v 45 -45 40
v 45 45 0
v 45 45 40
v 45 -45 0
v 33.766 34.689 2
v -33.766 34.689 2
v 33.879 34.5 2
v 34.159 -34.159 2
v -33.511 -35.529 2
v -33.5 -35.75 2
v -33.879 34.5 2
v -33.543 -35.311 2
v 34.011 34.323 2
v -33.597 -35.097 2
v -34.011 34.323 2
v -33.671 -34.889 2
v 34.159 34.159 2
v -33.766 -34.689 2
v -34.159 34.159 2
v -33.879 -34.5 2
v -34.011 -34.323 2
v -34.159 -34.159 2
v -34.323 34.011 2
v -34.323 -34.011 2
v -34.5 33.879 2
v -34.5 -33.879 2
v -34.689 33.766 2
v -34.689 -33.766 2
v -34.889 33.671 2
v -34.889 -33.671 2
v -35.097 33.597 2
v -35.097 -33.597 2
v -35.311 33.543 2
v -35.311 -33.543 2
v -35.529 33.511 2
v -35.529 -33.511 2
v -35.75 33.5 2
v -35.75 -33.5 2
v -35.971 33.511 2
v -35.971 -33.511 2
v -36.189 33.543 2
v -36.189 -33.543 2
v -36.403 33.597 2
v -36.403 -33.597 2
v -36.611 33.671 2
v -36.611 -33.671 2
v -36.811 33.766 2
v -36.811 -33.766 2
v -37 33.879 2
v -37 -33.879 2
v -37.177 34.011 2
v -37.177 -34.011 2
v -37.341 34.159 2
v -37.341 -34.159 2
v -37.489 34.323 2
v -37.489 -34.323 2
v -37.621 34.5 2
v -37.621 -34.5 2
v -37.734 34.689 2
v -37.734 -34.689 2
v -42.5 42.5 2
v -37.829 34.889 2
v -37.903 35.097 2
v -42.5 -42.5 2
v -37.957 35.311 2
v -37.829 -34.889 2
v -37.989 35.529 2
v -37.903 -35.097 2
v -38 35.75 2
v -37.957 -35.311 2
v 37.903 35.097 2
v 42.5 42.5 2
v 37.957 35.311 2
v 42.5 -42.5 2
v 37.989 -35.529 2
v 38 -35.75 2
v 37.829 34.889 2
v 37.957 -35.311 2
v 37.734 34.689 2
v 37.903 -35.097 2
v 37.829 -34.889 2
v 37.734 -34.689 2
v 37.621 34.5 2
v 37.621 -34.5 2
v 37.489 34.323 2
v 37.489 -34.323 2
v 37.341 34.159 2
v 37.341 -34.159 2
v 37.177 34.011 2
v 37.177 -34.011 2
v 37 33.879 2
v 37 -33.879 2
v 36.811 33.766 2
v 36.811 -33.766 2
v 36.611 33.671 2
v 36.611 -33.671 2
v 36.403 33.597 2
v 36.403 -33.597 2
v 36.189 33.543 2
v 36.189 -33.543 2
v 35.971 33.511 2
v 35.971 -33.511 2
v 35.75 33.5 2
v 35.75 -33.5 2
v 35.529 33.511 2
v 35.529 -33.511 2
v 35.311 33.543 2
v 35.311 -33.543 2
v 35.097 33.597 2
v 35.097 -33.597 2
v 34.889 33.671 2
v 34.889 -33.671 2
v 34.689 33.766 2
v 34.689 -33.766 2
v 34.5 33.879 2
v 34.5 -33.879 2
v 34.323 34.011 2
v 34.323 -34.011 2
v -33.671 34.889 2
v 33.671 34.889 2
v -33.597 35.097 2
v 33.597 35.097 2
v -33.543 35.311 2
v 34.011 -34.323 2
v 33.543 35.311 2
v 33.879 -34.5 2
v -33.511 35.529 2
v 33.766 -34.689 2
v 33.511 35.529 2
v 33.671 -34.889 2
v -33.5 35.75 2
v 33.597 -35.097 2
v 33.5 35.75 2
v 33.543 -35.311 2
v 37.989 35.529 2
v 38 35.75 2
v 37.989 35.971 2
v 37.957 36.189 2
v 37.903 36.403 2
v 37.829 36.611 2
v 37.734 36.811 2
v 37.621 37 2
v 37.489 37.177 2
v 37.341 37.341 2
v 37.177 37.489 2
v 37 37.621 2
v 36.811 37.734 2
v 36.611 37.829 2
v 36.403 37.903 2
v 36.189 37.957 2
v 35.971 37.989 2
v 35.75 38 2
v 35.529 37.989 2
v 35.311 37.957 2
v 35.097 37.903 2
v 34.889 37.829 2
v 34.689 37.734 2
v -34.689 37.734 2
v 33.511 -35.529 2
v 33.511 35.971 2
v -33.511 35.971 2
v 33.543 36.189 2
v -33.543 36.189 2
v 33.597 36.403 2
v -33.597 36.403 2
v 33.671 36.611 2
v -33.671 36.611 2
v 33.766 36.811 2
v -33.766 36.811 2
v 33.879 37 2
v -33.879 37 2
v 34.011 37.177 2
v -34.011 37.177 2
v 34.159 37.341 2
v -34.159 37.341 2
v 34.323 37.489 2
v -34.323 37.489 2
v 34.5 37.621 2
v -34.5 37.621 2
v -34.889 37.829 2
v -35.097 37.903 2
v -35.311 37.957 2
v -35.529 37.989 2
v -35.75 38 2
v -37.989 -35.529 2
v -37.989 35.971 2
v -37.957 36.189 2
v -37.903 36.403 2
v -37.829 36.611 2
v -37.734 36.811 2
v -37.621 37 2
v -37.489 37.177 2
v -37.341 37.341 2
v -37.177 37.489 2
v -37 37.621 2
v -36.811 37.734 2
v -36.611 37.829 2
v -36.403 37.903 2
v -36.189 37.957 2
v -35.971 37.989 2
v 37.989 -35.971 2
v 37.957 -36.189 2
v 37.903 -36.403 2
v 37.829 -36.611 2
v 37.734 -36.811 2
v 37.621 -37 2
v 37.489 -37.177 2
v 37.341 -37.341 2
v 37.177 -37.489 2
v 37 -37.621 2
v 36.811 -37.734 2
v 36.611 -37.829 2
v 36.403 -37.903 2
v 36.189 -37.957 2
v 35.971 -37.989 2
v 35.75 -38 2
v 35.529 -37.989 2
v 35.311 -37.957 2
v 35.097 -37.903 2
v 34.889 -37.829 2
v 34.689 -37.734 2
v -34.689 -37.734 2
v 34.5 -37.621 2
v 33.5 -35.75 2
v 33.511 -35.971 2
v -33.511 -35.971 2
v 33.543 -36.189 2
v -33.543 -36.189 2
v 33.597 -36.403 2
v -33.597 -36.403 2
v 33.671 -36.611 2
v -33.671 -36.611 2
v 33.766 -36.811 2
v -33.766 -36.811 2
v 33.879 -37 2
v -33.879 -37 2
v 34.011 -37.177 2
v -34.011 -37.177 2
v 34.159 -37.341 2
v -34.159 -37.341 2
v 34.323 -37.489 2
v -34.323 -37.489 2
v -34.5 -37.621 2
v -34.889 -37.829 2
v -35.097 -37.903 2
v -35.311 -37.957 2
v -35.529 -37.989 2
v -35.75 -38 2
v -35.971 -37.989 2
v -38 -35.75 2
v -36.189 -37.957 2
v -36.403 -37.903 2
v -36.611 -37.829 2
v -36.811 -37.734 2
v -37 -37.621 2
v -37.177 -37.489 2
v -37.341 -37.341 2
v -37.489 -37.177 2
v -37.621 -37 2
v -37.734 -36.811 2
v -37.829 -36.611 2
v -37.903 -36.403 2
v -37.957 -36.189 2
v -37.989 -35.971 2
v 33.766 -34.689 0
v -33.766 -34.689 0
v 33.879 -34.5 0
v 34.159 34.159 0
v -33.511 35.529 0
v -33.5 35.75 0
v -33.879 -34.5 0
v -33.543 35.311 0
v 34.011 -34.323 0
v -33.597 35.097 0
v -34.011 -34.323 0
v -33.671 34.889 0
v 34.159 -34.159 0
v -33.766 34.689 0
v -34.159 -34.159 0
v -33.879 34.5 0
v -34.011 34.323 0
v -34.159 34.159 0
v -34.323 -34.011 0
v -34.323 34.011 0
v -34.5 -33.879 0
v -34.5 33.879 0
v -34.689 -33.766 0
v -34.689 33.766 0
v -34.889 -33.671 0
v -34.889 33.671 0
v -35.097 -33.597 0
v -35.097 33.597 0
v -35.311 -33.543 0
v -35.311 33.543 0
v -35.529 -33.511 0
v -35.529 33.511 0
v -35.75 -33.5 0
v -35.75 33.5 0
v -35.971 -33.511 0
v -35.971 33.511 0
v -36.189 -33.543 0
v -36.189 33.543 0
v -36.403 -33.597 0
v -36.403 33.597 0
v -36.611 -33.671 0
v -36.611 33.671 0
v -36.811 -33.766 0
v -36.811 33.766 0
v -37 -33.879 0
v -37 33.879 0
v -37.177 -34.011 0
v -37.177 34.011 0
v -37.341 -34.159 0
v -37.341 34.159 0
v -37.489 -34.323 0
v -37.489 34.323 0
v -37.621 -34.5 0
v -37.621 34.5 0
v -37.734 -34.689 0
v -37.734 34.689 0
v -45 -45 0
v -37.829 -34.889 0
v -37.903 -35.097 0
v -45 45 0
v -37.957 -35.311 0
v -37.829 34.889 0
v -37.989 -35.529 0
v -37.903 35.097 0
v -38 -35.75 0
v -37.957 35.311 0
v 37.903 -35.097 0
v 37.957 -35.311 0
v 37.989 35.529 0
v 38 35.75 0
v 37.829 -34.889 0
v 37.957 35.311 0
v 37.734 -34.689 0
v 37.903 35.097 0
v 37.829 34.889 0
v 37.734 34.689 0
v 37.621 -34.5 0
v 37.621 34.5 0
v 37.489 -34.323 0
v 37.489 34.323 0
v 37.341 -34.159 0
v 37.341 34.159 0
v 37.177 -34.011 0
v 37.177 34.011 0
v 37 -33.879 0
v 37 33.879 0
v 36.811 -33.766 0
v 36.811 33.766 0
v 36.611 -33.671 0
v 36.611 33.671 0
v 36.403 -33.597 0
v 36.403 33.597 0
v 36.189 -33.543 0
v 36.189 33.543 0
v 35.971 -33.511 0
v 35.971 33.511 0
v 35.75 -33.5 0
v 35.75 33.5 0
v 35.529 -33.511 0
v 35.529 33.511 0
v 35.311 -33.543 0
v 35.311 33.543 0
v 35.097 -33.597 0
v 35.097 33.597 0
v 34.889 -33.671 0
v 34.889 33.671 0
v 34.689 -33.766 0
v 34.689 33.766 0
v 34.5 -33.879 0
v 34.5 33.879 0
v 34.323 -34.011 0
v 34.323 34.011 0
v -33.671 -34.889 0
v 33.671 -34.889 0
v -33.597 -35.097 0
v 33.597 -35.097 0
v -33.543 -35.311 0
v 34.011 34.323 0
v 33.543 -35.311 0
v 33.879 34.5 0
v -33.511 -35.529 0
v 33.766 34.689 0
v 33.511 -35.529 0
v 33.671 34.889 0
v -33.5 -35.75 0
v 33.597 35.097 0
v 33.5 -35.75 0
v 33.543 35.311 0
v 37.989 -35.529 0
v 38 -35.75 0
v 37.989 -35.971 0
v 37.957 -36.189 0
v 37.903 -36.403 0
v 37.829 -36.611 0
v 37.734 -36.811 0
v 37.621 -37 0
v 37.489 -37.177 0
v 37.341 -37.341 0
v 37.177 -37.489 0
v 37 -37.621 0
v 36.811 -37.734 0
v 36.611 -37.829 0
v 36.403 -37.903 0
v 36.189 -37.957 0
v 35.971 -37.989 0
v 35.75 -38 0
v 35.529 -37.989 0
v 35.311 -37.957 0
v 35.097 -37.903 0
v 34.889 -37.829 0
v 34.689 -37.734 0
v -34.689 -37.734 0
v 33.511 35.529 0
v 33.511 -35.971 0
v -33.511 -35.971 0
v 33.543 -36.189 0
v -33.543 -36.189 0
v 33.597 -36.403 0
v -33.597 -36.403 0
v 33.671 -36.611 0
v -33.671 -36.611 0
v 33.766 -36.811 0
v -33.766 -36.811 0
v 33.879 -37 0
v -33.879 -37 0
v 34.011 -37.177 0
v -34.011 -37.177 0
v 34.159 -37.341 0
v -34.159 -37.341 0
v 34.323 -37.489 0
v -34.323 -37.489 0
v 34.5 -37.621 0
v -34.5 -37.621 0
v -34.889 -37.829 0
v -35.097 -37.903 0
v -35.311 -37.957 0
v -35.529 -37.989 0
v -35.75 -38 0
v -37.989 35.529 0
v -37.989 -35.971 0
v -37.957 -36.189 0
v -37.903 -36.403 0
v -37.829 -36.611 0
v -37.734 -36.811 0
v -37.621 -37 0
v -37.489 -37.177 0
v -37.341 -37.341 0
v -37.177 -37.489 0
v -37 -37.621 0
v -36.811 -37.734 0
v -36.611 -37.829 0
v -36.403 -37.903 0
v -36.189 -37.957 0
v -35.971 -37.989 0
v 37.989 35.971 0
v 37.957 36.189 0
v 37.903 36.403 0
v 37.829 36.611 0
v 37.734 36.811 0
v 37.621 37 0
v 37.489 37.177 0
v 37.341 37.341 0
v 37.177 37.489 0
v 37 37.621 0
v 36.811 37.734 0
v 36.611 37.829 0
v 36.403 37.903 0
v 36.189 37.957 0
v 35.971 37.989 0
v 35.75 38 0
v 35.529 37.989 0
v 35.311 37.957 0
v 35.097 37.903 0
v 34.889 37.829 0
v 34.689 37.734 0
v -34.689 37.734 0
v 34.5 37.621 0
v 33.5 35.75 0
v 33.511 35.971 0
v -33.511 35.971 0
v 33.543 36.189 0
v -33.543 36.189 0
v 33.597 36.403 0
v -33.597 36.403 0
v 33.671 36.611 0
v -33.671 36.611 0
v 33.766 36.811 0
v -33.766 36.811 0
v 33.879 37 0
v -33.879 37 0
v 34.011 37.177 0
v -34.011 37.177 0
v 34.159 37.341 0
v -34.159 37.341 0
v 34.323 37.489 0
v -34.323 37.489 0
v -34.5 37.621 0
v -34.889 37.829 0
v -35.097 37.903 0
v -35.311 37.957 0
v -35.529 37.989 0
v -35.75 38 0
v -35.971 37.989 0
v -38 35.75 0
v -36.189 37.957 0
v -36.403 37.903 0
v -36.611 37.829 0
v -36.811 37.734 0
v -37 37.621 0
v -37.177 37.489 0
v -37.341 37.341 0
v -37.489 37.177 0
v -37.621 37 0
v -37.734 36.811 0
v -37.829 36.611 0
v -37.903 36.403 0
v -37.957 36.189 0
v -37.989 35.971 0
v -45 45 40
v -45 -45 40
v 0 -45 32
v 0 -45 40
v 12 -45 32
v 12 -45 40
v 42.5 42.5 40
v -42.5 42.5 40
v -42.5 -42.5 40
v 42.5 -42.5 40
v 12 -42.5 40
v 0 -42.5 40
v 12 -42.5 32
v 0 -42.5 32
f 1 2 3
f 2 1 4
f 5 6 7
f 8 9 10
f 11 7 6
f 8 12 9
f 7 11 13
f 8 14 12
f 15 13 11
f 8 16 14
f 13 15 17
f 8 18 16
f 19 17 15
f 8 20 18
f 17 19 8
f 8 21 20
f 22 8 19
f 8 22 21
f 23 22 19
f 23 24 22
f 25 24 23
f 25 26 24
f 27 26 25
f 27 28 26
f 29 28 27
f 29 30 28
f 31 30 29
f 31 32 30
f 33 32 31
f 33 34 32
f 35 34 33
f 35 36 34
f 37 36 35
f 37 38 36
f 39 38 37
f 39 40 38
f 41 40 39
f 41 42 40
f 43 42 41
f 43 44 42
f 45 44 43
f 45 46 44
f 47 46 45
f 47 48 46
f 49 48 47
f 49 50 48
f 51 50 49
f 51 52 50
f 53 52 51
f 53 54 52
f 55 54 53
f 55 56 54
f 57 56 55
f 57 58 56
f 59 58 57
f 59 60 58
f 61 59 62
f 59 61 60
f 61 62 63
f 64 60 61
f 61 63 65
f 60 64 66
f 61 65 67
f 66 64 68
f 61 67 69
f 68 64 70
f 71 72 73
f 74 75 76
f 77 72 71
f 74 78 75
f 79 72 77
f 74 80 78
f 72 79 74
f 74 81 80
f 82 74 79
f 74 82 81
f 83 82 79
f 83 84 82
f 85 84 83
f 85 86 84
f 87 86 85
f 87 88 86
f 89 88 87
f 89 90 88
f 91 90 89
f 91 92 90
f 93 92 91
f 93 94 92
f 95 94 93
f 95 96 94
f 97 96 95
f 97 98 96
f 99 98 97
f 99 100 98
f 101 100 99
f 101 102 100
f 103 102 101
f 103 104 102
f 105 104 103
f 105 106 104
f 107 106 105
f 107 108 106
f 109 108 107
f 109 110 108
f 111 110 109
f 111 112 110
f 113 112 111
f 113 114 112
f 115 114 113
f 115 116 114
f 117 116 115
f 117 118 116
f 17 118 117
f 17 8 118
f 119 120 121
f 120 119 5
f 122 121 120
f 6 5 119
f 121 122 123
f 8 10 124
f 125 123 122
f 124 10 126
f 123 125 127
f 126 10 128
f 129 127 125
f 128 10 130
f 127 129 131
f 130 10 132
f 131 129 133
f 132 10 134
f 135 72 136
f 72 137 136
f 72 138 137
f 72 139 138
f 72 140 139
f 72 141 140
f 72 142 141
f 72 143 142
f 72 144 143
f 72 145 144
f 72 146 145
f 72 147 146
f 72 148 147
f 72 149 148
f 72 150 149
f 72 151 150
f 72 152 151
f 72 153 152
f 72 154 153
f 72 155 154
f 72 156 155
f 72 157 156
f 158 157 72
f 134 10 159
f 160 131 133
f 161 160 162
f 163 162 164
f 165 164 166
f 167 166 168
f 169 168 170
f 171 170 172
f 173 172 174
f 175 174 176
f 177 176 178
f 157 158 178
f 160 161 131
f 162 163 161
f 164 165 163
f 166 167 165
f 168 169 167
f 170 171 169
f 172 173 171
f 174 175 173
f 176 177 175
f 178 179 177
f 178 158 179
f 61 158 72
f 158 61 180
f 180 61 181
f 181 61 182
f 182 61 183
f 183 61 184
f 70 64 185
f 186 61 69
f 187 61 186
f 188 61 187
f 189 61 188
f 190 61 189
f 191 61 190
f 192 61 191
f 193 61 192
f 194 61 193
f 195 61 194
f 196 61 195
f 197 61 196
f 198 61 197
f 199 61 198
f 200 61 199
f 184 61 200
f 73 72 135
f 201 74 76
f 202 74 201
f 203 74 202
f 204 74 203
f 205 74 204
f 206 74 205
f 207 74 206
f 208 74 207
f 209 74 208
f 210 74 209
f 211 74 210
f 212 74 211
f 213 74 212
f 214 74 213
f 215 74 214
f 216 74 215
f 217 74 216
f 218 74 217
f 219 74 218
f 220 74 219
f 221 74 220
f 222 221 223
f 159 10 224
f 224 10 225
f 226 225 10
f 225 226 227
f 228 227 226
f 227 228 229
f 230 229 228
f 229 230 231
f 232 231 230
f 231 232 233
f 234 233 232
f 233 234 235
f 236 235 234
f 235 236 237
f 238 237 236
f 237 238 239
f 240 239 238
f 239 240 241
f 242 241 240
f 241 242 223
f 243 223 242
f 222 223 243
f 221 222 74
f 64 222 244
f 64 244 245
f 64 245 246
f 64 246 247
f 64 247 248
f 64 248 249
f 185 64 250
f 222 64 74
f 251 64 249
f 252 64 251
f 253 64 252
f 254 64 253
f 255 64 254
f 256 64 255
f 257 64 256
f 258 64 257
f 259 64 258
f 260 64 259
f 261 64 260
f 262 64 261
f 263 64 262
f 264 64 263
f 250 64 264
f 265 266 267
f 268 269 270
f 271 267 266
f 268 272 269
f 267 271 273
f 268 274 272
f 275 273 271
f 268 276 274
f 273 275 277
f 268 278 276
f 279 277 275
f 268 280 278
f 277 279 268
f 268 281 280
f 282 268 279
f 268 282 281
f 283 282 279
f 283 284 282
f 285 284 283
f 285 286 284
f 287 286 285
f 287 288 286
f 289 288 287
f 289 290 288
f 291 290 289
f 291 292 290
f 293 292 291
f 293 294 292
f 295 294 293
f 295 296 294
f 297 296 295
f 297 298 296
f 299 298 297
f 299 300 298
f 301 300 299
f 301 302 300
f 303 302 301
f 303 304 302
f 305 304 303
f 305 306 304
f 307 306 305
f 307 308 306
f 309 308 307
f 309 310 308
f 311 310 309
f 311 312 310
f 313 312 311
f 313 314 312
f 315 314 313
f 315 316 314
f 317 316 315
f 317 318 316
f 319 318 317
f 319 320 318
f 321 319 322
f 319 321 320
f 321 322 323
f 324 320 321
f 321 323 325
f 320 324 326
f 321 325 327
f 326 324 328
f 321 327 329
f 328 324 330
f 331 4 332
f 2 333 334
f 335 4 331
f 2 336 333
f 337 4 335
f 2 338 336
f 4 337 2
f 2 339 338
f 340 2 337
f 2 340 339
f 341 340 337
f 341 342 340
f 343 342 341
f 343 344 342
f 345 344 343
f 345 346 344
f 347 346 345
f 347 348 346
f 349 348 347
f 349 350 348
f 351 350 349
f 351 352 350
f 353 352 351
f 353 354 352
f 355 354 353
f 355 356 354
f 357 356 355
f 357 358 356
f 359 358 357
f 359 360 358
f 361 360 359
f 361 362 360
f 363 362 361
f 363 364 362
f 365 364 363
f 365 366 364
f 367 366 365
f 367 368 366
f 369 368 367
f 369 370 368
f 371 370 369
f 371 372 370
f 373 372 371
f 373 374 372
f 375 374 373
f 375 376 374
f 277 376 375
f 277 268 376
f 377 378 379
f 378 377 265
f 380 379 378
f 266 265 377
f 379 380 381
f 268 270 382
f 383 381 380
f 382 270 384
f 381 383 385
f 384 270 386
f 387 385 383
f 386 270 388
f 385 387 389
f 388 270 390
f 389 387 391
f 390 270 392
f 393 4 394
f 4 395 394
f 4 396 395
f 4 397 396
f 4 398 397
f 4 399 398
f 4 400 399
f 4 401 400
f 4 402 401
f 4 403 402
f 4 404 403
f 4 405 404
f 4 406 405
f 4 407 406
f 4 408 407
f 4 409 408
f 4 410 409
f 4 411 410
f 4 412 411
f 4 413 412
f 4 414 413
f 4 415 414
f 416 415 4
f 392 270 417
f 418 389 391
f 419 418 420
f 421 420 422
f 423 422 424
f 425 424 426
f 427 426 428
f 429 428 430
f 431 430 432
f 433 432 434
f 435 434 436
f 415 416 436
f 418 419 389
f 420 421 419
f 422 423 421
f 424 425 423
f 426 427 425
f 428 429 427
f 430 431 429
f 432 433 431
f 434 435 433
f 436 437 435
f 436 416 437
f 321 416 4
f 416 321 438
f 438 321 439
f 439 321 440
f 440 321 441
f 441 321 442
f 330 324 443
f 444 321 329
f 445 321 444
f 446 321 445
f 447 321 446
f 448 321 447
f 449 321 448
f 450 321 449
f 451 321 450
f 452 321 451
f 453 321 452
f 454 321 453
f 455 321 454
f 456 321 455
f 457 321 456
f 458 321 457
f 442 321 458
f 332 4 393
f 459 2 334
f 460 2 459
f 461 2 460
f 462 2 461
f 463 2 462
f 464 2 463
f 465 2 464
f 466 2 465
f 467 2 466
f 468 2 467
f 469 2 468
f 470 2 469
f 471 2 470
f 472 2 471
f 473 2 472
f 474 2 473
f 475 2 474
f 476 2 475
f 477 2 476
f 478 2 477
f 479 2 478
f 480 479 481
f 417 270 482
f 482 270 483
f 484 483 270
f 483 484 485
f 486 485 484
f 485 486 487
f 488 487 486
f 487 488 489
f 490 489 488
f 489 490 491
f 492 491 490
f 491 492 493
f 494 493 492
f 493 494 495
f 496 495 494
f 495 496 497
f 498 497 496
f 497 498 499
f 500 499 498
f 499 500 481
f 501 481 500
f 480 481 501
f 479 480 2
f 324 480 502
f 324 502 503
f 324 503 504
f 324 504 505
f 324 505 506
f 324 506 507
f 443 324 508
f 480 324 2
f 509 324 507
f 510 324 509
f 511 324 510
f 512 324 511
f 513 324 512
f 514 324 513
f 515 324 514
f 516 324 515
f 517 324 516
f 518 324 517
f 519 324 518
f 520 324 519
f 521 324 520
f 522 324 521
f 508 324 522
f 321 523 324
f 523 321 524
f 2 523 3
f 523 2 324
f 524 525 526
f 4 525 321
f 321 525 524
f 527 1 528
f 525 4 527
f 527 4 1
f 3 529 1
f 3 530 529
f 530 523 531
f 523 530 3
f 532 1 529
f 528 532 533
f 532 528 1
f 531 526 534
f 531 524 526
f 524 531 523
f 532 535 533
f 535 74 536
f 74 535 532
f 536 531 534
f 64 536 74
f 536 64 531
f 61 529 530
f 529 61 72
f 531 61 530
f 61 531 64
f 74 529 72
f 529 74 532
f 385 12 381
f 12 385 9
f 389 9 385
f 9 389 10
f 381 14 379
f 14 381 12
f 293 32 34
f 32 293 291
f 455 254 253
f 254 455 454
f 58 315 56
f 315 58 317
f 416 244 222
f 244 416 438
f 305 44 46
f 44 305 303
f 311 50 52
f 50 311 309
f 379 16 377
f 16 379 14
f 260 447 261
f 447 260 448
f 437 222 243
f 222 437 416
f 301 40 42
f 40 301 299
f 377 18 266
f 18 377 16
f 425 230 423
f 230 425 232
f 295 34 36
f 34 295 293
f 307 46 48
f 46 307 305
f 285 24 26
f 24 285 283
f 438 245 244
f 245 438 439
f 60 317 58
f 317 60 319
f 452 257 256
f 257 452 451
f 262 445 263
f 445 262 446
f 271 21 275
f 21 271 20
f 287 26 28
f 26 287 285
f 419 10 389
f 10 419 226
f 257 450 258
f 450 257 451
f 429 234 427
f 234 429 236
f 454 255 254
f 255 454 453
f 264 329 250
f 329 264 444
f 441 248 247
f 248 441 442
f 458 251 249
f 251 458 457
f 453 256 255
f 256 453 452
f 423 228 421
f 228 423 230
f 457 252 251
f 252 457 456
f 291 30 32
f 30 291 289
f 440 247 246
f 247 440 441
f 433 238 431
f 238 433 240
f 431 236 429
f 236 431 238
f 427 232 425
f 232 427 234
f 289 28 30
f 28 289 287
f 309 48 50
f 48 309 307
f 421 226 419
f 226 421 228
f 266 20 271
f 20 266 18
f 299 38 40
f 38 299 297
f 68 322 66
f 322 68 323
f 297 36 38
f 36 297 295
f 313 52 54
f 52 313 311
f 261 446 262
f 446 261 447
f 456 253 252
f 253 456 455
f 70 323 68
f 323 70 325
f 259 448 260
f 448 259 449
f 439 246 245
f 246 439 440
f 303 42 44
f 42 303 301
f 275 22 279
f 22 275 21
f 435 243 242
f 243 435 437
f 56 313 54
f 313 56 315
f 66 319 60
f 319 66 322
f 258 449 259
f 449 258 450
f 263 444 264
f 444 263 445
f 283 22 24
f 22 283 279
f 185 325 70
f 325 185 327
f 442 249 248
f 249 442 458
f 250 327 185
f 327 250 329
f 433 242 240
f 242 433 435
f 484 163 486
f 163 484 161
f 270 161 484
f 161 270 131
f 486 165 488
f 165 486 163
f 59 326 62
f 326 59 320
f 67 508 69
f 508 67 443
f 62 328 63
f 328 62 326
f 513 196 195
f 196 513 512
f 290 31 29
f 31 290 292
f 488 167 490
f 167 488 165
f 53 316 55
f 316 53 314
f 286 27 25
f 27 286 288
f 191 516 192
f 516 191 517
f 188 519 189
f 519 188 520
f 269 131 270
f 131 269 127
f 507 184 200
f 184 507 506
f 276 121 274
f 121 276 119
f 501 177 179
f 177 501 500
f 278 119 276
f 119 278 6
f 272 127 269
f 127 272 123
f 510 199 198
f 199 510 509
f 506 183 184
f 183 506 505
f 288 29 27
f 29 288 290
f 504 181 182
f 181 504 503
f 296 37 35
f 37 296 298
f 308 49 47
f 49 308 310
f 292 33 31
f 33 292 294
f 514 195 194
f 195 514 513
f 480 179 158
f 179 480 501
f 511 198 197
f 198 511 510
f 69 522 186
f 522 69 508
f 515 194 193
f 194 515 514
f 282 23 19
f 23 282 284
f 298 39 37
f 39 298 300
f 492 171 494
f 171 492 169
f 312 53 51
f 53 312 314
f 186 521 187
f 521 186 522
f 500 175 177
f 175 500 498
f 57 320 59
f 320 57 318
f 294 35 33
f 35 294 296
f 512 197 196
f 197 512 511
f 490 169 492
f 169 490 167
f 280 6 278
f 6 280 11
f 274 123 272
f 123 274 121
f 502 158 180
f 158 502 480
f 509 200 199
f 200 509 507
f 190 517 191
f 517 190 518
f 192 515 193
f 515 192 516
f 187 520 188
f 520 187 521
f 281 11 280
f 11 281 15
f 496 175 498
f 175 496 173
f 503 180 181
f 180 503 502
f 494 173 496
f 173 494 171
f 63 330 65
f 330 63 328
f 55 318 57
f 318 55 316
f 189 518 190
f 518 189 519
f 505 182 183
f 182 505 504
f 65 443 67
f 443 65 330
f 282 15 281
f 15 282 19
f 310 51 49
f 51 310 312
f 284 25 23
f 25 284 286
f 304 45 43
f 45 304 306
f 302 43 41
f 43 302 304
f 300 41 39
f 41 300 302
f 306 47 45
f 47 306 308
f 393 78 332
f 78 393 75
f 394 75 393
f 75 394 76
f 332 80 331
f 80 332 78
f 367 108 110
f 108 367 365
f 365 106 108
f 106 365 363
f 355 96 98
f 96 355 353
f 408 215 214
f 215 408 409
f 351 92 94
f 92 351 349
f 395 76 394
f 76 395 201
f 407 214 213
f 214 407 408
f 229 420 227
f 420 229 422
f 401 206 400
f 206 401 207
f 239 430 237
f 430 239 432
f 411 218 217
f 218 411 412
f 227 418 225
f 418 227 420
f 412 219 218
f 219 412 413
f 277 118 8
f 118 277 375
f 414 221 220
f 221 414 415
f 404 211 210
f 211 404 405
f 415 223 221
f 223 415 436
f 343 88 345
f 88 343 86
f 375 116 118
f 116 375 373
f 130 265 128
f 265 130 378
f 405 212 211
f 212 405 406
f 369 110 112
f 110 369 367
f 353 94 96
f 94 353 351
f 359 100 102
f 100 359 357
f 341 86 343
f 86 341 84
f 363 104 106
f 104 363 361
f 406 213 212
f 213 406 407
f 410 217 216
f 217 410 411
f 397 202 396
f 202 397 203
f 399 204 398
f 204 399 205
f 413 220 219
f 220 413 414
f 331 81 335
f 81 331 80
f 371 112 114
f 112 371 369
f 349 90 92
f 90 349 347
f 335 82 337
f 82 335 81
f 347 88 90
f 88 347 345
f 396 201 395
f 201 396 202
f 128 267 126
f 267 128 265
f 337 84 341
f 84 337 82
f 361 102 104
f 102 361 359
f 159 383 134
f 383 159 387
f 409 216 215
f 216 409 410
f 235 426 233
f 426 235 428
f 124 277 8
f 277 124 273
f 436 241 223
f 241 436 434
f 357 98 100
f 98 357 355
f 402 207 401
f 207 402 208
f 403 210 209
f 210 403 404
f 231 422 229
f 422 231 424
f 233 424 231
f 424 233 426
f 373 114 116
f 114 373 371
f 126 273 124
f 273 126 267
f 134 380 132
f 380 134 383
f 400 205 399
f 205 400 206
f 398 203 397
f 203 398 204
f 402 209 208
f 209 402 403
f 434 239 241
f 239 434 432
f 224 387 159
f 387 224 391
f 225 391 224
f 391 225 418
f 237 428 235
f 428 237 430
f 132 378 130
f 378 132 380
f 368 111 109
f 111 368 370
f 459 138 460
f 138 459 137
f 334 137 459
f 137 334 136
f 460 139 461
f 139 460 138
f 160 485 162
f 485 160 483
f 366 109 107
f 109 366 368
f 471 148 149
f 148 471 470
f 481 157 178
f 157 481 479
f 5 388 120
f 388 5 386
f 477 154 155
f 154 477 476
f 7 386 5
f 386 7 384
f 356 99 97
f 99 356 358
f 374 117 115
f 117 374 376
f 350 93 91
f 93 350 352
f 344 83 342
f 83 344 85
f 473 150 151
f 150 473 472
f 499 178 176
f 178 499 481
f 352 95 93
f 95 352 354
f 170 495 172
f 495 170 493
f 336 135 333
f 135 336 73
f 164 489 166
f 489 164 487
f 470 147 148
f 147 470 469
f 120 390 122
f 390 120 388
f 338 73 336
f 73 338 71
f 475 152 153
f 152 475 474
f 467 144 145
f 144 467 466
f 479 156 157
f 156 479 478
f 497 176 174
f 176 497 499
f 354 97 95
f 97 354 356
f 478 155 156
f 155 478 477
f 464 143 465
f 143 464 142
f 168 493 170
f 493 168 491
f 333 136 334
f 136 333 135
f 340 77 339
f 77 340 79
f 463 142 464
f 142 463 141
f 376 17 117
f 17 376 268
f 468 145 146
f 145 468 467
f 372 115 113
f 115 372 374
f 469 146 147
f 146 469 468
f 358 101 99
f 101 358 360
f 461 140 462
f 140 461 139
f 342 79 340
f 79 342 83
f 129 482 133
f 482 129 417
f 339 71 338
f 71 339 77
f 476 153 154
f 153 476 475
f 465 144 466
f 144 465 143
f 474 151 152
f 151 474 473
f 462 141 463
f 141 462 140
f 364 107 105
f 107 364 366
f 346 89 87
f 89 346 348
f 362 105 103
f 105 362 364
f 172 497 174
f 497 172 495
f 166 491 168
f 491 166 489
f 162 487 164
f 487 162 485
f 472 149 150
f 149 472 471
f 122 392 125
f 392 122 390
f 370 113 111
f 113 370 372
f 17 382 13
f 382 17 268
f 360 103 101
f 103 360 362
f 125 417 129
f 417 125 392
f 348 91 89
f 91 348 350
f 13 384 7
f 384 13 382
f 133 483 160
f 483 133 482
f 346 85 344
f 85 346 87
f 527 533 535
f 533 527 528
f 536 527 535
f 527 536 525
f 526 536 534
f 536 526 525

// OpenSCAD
// DIY magnetic stirrer housing for an 80 mm PC case fan.
// Modelled in print orientation: the 2 mm top plate lies on the bed (z = 0..2)
// and the four 2.5 mm walls rise to z = 40, leaving the box open at the top.

$fn = 64;

// ---- Dimensions (mm) ----
top_plate_t   = 2;    // thickness of the top (stirring) plate
wall_t        = 2.5;  // thickness of each side wall
wall_h        = 38;   // wall height above the top plate (box open at z = 40)
outer_x       = 90;   // outer size in X
outer_y       = 90;   // outer size in Y

// M4 screw holes through the top plate, on the fan's mounting square
hole_d        = 4.5;  // hole diameter
hole_pitch    = 71.5; // square pitch, centred on the plate

// Power-cable notch in one wall
notch_w       = 12;   // notch width
notch_top     = 40;   // notch reaches the open edge (z = 40)
notch_bot     = 32;   // notch bottom (8 mm down from the open edge)

// ---- Derived geometry ----
inner_x       = outer_x - 2 * wall_t;   // inner clear width in X
inner_y       = outer_y - 2 * wall_t;   // inner clear width in Y

// ---- Body: top plate + four walls (union) ----
module body() { union() {
    // Top plate, centred on the origin, resting on the bed
    translate([-outer_x/2, -outer_y/2, 0])
        cube([outer_x, outer_y, top_plate_t]);

    // Four walls rising from the top plate to z = 40
    // South wall (front, -Y side)
    translate([-outer_x/2, -outer_y/2, top_plate_t])
        cube([outer_x, wall_t, wall_h]);
    // North wall (back, +Y side)
    translate([-outer_x/2, outer_y/2 - wall_t, top_plate_t])
        cube([outer_x, wall_t, wall_h]);
    // West wall (left, -X side)
    translate([-outer_x/2, -inner_y/2, top_plate_t])
        cube([wall_t, inner_y, wall_h]);
    // East wall (right, +X side)
    translate([outer_x/2 - wall_t, -inner_y/2, top_plate_t])
        cube([wall_t, inner_y, wall_h]);
} }

// ---- Cuts ----
// Four M4 screw holes through the top plate (extend 1 mm past each face)
module screw_holes() { for (dx = [-hole_pitch/2, hole_pitch/2],
                   dy = [-hole_pitch/2, hole_pitch/2])
    translate([dx, dy, -1])
        cylinder(h = top_plate_t + 2, d = hole_d, $fn = $fn); }

// Power-cable notch in the south wall (extend 1 mm past each face it cuts)
module cable_notch() { translate([0, -outer_y/2 - 1, notch_bot])
    cube([notch_w, wall_t + 2, notch_top - notch_bot + 1]); }

// ---- Final part ----
difference() {
    body();
    screw_holes();
    cable_notch();
}
